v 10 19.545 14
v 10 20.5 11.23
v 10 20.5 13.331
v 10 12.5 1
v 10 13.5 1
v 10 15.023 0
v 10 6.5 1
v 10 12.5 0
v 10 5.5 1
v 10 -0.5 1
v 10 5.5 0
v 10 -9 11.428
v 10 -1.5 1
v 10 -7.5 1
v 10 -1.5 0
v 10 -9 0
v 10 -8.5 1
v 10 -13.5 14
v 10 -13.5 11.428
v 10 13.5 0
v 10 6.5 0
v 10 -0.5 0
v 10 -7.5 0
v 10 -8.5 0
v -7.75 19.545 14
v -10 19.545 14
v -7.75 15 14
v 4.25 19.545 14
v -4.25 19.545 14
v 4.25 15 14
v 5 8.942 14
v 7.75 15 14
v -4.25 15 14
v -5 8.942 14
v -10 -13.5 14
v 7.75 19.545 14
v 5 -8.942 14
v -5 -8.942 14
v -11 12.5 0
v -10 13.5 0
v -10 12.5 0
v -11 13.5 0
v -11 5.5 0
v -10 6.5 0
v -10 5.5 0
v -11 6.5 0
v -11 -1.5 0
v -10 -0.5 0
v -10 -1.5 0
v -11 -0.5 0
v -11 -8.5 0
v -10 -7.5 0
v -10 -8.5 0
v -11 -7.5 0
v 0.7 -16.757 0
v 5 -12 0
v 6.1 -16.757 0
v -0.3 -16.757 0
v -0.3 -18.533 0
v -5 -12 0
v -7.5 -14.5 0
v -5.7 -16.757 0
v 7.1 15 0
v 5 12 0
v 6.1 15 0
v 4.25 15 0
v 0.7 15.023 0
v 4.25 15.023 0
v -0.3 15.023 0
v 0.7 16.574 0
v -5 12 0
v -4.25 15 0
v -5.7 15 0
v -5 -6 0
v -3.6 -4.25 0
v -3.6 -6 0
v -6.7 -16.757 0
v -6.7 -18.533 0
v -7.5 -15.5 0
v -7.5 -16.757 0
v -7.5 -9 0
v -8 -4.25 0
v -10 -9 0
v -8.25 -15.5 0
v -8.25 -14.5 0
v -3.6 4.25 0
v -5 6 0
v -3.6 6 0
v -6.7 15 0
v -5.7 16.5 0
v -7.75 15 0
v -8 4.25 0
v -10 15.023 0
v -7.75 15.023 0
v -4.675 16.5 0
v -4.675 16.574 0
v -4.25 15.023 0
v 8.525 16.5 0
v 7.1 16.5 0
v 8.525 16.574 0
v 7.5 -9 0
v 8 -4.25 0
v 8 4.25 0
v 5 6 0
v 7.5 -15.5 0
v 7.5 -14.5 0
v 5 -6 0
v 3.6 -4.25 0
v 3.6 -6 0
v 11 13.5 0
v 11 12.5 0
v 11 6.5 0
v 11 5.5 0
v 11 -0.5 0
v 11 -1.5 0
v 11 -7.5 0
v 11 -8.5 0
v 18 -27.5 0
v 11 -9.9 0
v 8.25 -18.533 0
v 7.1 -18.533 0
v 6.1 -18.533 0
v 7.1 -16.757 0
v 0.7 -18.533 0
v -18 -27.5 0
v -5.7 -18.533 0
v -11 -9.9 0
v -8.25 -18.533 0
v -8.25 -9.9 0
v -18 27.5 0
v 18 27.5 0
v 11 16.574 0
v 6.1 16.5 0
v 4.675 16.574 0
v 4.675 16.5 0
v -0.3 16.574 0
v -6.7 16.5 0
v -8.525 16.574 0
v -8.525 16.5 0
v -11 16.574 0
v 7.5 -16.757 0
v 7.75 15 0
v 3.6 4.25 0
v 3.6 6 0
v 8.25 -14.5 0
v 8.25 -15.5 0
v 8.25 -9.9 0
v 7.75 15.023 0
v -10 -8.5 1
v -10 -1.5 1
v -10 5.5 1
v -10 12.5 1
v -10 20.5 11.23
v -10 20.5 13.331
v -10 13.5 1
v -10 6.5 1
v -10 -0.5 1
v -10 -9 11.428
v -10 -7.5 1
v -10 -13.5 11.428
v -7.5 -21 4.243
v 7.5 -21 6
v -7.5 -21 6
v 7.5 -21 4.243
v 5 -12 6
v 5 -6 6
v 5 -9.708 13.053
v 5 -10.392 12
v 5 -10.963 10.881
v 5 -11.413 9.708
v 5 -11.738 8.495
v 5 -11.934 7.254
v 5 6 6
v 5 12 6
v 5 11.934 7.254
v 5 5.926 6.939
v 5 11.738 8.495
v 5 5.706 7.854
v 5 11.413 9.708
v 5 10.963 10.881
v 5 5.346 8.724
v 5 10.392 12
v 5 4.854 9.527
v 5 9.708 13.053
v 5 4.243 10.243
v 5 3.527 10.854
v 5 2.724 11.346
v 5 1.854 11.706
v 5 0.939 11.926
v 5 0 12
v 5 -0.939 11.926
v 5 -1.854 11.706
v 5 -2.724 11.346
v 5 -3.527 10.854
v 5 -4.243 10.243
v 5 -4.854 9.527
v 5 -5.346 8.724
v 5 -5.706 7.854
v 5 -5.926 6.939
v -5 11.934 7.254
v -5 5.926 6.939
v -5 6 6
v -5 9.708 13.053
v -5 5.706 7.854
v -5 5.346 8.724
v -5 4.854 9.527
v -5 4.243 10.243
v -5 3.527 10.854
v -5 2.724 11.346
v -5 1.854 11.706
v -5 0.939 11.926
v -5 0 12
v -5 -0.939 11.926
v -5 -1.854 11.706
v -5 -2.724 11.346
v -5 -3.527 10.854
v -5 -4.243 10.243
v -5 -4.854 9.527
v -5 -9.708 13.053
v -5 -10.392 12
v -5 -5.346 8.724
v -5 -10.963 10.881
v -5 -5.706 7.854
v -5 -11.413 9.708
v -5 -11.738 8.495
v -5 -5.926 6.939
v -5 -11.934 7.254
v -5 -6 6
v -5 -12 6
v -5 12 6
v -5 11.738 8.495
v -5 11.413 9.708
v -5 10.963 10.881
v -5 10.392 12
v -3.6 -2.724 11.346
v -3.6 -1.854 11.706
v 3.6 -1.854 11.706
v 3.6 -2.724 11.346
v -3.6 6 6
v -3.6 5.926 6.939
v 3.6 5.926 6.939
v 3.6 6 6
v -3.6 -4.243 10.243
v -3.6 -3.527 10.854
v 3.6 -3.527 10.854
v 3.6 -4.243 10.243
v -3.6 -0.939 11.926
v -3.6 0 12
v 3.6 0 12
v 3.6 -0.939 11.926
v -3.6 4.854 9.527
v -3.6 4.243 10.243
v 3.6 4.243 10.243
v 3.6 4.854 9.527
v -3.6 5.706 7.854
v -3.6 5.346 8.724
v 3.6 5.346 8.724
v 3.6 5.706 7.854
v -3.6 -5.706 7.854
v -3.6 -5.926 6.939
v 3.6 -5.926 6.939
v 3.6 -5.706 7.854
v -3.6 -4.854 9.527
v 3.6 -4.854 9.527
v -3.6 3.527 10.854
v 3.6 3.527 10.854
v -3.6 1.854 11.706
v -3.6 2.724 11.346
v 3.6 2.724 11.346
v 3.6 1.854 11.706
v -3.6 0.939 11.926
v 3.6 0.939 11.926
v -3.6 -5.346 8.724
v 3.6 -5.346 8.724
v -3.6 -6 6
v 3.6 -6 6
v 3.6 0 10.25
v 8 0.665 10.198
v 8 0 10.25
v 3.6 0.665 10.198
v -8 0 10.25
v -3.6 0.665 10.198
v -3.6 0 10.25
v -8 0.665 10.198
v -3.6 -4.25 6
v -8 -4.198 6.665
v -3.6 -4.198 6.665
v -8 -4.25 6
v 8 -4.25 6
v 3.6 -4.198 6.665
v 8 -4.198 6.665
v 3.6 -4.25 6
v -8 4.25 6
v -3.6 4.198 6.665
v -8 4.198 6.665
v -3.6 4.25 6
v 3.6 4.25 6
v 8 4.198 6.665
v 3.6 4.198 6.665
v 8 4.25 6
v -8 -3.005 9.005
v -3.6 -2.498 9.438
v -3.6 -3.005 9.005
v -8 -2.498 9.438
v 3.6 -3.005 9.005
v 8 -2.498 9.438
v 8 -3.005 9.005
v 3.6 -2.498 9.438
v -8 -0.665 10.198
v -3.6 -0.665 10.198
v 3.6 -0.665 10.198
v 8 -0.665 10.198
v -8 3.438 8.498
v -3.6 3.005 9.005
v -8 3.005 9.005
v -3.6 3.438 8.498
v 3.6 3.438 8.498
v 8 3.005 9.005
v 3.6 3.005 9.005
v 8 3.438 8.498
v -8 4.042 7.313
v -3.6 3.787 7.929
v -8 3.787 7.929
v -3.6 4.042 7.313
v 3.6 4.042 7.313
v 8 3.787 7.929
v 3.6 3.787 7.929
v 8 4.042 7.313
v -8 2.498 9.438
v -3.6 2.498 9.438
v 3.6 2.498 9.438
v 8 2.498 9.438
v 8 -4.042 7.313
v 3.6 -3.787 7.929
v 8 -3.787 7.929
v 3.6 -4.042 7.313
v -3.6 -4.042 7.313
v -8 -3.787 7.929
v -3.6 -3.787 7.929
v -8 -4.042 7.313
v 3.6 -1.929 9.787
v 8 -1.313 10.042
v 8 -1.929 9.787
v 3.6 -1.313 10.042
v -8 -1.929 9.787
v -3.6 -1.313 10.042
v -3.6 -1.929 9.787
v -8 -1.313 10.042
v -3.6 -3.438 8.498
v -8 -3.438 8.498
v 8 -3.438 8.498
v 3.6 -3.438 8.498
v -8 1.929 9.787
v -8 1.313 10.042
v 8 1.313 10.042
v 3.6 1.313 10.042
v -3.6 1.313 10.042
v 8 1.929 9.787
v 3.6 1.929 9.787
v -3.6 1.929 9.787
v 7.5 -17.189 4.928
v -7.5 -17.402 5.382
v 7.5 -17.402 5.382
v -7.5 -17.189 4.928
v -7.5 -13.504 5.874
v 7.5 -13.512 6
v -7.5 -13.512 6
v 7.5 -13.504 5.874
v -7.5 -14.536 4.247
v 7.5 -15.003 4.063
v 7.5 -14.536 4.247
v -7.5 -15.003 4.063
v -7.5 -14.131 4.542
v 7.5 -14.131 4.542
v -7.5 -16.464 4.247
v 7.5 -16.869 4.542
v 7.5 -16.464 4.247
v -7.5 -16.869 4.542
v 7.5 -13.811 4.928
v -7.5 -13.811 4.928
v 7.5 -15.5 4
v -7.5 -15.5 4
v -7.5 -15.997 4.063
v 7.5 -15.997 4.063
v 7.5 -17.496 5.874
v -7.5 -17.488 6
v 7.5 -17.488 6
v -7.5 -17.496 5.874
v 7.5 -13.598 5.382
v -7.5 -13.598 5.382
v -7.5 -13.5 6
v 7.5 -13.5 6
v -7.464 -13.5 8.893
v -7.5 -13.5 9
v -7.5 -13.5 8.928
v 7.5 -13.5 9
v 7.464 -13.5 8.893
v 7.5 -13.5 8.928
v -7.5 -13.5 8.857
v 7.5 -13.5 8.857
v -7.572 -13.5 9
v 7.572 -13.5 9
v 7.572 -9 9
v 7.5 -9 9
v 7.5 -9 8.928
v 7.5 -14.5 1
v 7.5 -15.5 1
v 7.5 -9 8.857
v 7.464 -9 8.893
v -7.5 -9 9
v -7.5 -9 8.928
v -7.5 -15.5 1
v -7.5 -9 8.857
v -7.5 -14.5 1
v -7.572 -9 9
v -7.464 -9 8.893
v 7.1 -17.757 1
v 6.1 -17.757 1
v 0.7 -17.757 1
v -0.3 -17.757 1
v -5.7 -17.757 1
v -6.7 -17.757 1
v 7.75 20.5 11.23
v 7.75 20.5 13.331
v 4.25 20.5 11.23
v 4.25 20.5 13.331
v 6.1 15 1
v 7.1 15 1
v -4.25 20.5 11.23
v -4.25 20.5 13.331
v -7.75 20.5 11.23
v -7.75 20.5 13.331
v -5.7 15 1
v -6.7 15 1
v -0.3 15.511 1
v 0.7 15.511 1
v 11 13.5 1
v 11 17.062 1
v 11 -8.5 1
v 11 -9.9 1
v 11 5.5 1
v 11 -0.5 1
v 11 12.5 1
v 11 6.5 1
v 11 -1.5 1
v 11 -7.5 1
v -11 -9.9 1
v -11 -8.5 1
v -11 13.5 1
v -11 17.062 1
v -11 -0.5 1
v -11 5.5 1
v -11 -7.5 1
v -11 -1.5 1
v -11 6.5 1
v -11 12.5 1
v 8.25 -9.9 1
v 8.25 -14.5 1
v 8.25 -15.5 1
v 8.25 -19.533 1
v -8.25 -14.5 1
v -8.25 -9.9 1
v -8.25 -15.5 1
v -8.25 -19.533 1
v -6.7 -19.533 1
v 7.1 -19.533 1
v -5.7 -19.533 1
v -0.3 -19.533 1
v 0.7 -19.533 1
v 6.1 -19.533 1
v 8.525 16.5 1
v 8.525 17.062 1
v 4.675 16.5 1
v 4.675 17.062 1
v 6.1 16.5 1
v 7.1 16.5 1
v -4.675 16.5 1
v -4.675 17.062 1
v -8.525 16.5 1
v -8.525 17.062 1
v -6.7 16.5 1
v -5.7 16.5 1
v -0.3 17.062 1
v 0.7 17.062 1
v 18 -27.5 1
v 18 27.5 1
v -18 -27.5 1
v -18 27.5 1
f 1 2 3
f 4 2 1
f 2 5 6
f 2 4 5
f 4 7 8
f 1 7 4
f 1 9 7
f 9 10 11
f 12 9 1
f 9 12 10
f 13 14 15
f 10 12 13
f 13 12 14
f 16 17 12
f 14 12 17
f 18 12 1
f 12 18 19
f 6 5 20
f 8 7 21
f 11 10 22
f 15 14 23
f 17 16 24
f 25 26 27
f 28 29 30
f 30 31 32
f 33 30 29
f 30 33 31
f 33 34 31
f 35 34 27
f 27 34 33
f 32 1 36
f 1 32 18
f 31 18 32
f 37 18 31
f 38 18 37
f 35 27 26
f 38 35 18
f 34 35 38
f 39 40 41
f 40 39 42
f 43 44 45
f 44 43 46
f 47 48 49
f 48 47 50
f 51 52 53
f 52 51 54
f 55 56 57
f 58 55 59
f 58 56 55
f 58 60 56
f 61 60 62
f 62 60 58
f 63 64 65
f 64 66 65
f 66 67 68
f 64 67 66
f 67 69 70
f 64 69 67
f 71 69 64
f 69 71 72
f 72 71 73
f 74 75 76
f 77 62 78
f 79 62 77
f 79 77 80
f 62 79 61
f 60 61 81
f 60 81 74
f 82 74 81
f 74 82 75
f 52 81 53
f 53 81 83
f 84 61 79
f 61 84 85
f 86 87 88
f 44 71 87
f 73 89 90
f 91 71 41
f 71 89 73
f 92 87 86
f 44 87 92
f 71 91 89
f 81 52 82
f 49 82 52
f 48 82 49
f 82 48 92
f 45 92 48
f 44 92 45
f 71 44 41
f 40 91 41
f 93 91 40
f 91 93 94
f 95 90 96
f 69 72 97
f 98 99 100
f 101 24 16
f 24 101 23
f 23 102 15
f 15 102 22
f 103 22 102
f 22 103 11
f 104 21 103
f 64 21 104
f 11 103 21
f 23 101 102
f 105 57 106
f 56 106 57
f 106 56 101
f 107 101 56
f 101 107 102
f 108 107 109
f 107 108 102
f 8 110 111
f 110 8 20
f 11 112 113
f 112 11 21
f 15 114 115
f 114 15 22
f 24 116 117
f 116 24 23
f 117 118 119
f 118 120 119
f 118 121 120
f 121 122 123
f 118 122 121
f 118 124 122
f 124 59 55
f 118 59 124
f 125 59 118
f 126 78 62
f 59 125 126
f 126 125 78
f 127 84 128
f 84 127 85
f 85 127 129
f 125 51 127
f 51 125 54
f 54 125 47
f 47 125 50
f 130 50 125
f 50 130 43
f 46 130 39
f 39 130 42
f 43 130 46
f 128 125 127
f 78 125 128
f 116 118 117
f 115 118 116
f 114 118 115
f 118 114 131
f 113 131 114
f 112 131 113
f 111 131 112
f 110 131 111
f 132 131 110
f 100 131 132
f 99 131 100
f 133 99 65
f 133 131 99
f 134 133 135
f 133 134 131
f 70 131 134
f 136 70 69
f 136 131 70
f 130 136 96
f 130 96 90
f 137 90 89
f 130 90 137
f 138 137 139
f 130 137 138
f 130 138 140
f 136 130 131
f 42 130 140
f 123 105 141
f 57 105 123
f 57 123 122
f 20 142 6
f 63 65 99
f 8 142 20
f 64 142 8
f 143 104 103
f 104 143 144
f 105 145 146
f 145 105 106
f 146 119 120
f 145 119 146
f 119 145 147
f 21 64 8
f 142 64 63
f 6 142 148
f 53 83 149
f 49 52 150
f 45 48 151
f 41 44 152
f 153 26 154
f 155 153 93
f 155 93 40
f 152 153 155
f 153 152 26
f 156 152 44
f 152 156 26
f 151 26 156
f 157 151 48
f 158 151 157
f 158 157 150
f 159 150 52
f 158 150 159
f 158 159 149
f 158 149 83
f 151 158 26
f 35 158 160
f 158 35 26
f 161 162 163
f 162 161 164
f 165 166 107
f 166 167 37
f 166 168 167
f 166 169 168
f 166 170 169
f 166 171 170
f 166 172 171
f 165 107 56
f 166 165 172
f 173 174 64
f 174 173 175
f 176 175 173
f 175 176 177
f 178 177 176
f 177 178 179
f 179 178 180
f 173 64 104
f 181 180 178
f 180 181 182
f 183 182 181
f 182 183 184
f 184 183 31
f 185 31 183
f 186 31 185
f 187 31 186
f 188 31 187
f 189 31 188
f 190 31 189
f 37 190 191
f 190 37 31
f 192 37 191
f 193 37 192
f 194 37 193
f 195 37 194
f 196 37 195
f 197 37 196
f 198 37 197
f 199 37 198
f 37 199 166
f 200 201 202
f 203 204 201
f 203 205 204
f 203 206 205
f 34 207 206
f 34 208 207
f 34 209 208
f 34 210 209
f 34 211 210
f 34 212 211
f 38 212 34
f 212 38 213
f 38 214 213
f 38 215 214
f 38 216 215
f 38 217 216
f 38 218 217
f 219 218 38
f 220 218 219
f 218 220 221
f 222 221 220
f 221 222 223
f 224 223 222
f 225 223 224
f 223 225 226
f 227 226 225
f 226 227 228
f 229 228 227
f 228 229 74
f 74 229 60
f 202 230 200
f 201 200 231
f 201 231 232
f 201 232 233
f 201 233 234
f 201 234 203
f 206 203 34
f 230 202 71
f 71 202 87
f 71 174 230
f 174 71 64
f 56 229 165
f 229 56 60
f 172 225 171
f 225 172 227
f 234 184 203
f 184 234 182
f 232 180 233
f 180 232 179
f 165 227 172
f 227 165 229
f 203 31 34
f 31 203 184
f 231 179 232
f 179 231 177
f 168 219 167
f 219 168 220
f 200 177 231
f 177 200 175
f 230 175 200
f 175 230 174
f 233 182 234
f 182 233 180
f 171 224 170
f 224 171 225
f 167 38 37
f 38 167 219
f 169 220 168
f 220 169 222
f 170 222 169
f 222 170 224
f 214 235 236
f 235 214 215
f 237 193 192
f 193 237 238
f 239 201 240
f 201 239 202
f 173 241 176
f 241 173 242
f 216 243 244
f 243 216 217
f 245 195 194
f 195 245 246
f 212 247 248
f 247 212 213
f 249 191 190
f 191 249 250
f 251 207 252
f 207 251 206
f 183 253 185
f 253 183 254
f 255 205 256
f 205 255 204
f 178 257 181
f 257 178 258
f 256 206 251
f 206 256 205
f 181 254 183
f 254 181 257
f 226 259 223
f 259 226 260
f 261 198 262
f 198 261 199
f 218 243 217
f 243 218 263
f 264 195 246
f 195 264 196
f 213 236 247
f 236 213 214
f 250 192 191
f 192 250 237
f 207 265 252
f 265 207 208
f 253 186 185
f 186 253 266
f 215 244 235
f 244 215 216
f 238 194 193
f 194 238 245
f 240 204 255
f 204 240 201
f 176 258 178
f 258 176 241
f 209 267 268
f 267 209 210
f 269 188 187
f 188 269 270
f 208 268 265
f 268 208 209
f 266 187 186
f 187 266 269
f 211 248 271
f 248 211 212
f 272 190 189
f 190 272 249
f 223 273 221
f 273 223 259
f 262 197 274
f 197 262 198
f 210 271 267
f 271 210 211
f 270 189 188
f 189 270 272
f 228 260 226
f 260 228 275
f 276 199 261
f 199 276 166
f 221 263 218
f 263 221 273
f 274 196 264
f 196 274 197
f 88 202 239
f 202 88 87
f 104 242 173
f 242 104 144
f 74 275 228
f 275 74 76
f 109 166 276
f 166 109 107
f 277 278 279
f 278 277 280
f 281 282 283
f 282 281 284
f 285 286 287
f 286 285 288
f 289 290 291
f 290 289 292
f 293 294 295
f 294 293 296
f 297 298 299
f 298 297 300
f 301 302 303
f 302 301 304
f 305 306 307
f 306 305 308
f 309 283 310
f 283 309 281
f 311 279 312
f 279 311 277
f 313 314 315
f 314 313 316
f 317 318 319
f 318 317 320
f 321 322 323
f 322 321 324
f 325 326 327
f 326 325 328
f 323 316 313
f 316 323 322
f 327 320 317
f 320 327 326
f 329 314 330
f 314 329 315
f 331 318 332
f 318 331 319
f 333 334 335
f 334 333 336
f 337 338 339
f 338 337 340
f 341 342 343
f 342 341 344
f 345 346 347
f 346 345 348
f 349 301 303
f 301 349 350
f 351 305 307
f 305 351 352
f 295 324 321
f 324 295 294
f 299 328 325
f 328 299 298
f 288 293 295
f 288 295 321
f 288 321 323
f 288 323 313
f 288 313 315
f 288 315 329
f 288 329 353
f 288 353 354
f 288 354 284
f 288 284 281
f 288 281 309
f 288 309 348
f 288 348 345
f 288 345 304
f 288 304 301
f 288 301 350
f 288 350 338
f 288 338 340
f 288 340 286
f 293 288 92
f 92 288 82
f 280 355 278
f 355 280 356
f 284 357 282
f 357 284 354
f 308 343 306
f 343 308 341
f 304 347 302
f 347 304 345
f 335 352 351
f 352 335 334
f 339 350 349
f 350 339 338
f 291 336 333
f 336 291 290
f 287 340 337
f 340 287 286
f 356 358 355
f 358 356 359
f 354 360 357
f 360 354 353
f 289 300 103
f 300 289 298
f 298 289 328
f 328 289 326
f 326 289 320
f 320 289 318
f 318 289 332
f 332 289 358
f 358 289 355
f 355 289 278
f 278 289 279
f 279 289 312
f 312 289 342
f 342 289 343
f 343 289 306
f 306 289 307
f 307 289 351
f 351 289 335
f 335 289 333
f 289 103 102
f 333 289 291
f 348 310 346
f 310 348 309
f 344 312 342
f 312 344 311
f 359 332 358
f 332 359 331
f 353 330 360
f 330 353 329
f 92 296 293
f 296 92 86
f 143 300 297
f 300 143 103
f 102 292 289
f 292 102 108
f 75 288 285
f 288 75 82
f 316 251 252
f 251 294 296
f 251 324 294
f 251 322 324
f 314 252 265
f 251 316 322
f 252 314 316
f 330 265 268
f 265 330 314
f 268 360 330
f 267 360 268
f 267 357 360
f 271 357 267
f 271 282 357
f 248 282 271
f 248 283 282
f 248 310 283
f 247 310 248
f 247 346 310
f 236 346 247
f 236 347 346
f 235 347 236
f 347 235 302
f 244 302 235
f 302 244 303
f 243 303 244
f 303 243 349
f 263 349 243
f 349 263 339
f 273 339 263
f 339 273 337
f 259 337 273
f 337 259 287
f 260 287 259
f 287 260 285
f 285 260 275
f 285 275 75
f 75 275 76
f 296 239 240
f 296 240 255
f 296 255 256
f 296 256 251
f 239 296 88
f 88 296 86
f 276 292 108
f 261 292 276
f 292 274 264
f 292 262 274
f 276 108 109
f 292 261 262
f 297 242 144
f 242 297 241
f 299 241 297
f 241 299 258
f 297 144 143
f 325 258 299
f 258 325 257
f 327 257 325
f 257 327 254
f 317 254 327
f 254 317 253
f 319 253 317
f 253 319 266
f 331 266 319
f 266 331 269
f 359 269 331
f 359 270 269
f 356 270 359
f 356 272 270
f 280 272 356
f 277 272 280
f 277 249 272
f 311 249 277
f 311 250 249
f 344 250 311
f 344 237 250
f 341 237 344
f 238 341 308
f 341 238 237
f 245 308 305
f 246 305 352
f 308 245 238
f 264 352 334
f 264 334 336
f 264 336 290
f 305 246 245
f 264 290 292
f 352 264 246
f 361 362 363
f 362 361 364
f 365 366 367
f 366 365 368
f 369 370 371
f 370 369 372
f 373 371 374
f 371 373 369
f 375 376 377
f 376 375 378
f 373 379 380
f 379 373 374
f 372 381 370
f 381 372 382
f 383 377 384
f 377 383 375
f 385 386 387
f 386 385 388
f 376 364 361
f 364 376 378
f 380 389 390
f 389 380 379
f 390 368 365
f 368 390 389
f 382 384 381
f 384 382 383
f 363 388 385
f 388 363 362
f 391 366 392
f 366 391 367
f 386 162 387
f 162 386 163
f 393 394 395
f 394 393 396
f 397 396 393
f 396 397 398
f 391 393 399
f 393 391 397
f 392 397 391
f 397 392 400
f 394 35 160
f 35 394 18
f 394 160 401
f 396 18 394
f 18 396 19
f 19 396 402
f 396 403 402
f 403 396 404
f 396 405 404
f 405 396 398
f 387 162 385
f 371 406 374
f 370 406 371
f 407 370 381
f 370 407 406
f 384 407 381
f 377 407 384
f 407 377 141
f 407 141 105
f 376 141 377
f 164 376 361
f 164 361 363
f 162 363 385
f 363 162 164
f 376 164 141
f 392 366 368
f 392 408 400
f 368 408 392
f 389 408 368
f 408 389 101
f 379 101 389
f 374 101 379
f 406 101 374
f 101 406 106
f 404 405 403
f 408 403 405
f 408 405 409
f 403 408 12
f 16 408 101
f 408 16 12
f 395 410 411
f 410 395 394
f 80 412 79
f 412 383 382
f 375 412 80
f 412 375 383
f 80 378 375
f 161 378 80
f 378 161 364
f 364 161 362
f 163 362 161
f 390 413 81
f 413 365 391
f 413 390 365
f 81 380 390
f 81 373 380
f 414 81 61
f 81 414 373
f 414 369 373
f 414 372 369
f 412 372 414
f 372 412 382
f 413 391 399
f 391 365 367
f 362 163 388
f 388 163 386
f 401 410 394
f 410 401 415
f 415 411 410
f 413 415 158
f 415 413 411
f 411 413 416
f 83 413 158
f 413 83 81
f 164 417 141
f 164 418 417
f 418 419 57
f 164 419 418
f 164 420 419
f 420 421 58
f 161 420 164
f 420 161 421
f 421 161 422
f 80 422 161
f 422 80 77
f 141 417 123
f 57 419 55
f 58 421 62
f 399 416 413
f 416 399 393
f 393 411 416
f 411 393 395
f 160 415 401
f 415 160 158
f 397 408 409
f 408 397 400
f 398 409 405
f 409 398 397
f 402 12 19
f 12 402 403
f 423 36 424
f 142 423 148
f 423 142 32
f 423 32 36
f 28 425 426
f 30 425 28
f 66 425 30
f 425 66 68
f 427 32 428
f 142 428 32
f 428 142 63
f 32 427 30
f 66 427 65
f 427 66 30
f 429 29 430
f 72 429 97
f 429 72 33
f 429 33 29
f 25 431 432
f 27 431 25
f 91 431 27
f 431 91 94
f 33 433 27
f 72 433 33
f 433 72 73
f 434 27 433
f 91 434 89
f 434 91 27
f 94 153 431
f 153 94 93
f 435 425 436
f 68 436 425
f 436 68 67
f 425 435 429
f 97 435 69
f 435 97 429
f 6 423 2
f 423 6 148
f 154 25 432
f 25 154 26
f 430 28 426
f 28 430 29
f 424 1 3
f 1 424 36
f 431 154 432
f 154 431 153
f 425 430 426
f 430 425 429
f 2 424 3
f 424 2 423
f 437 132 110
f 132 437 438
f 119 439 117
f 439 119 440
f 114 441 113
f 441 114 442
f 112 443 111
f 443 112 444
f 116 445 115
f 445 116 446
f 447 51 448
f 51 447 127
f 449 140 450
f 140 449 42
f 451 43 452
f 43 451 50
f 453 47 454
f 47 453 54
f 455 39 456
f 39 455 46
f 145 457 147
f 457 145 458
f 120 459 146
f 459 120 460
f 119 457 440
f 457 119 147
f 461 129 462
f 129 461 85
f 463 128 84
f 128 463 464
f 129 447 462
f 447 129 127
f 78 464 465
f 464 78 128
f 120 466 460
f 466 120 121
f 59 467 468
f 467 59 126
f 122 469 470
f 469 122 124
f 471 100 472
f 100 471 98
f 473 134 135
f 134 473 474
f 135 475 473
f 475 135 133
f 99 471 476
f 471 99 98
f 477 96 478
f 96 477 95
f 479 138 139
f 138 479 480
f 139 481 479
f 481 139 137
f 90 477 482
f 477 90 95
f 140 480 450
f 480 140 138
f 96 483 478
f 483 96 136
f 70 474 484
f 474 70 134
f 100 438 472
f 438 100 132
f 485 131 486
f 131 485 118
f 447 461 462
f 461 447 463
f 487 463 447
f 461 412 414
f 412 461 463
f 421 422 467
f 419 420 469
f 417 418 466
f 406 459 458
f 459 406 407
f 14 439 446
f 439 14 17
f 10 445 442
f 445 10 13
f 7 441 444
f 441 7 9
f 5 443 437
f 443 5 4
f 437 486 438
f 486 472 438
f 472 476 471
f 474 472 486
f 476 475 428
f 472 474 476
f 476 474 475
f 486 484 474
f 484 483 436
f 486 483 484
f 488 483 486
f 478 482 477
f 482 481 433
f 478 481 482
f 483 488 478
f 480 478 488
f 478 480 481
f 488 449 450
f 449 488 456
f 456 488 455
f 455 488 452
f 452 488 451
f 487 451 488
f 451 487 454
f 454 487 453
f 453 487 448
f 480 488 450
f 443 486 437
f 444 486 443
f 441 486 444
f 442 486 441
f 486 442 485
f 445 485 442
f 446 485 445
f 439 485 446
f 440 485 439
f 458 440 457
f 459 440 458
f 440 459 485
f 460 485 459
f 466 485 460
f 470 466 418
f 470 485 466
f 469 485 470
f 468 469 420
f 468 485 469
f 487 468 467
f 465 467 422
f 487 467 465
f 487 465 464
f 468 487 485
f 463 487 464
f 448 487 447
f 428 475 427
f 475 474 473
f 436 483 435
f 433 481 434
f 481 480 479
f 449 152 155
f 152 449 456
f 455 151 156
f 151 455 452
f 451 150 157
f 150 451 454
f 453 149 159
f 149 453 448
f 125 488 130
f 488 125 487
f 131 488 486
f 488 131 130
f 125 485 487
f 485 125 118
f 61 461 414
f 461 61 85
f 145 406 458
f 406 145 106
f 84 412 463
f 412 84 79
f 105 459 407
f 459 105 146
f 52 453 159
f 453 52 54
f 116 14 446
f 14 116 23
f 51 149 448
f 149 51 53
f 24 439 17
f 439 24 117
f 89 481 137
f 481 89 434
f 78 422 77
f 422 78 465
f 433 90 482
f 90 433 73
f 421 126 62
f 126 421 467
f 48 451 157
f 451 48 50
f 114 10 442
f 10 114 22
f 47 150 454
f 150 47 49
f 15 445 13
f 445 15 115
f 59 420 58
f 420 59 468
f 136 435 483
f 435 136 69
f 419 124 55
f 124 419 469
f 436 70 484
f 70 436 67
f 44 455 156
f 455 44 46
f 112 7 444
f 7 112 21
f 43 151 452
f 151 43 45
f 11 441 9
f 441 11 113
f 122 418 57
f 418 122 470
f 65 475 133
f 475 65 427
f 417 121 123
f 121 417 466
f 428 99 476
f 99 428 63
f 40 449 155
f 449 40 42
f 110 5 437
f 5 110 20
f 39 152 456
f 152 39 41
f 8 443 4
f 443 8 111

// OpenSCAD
// Airtripper's Bowden 3D Printer Extruder Revision 3
// by Airtripper May  © 2012
// airtripper.com
// It is licensed under the Creative Commons - GNU GPL license. 

// Printable extruder parts
	// set to true to show or false to hide.
	// F6 to compile, then menu: Design->Export as STL

show_extruder = false;
show_idler = false;
show_idler_with_flange = true;
show_strut = false;
show_axle = false;
show_all = false;
show_extruder_axle = false;
show_idler_strut = false;


if (show_extruder) {
	translate([0,0,0]) rotate([0,0,270]) extruder_block();
}
if (show_idler) {
	extruder_idler_608z();
} 
if (show_idler_with_flange) {
	idler_and_flange();
}
if (show_strut) {
	support_strut();
} 
if (show_axle) {
	axle_8mm();
} 
if (show_all) {
	translate([0,-20,0]) rotate([0,0,270]) extruder_block();
	translate([10,14,0]) rotate([0,0,90]) extruder_idler_608z(); //idler_and_flange();
	translate([10,32,0]) rotate([0,0,0]) support_strut();
	translate([-20,12,0]) rotate([0,0,0]) axle_8mm();
} 
if (show_extruder_axle) {
	translate([0,-10,0]) rotate([0,0,270]) extruder_block();
	translate([-0,22,0]) rotate([0,0,0]) axle_8mm();
}
if (show_idler_strut) {
	translate([0,-8,0]) rotate([0,0,90]) extruder_idler_608z(); //idler_and_flange();
	translate([0,10,0]) rotate([0,0,0]) support_strut();
} 


// Assembled components

//extruder();
//idler_608z();
//stepper_kit();


// Non printable hardware components

//nema17();
//insert();
//bearing(5, 10, 4);
//bearing(8, 22, 7);
//m4_bolt(40);



nema_l=71.5; // Stepper total length
nema_x=42;
nema_y=42;
nema_z=47.4;
screw_l=30;
insert_l=15; // Filament gripper insert length




// ************** Idler with Flange ***********************

module idler_and_flange() {
	extruder_idler_608z();
	difference() {
		union() {
			difference() {
				translate([0,0,0.5]) color("red") cube([36,55,1], center=true);
				translate([0,0,-0.1]) scale([1.1,1.1,1.1]) extruder_idler_608z();
			}
			for(r=[1:5]) {
				translate([0,r*70/10-22,0.5]) cube([30,1,1], center=true);
				translate([r*64/10-19,0,0.5]) rotate([0,0,90]) cube([50,1,1], center=true);
			}
		}
		union() {
			translate([0,0,0.5]) color("red") cube([12,28,2], center=true);
			translate([0,0,0.5]) color("red") cube([18,10,2], center=true);
		}
	}


}



// ##########################################################

module axle_8mm() {
	cylinder(16,r=3.80, $fn=40);
	// Support flange while printing
	translate([-5,-0.5,0]) cube([10,1,1]);
	translate([-0.5,-5,0]) cube([1,10,1]);
	difference() {
		cylinder(1,r=10, $fn=40);
		translate([0,0,-1]) cylinder(3,r=5, $fn=40);
	}
}


// ##########################################################

module extruder_idler_608z() {
	//translate([0,0,6]) rotate([0,90,0]) bearing(8, 22, 7);
	difference() {
		union() {
			difference() {
				translate([0,0,7]) cube([20,42,14], center = true);
				// Bearing housing
				//translate([-6,0,8]) cube([10,50,20], center = true);
				translate([0,0,1]) cube([10,24,10], center = true);
				translate([-5,0,6]) rotate([0,90,0]) cylinder(10,r=12, $fn=60);
			}
			// Axle spacer
			translate([-8,0,6]) rotate([0,90,0]) cylinder(16,r=6, $fn=40);
			translate([0,0,3]) cube([16,12,6], center = true);
		}
		union() {
			// Bearing axle cut-out
			translate([-8,0,6]) rotate([0,90,0]) cylinder(16,r=4.25, $fn=40);
			translate([0,0,2]) cube([16,8.5,8], center = true);
			translate([-3.6,0,6]) rotate([0,90,0]) cylinder(7.2,r=12, $fn=60);
			// hook
			translate([-9,-15.5,6]) rotate([0,90,0]) cylinder(22,r=2, $fn=25);
			translate([0,-18.5,11]) cube([22,10,10], center = true);
			translate([9,-17,1]) cube([3,16,16], center = true);
			translate([-9,-17,1]) cube([3,16,16], center = true);
			translate([0,-21,0]) rotate([45,0,0]) cube([24,6,10], center = true);
			translate([-11,-12,9.6]) rotate([0,135,0]) cube([4,6,6], center = true);
			translate([11,-12,9.6]) rotate([0,45,0]) cube([4,6,6], center = true);
			// Bolt slots
			translate([6,20,7]) cube([3.5,10,16], center = true);
			translate([-6,20,7]) cube([3.5,10,16], center = true);
			translate([0,24,7]) rotate([154,0,0]) cube([22,10,26], center = true);
			translate([0,26.5,25]) rotate([145,0,0]) cube([22,10,26], center = true);
			translate([0,25.5,7]) cube([22,10,16], center = true);
			//Padding
			//translate([-9,-17,7]) cube([6,10,16], center = true);
		}
	}

}


// #########################################################

// Revision 3

module extruder_block() {
	difference() {
		union() {
			// Extruder base
			translate([0,0,1.5]) cube([42,42,3], center = true);

			// Bearing supports between screw columns and shaft bearing
			rotate([0,0,45]) translate([0,11,13]) cube([3,22,26], center = true);
			rotate([0,0,315]) translate([0,-11,13]) cube([3,22,26], center = true);
			difference() {
				translate([-3,0,22]) cylinder(8,r1=4, r2=4, $fn=50, center = true);
				rotate([0,90,0]) translate([-17,0,-10]) cylinder(8,r=4, $fn=50);
			}
			difference() {
				translate([0,0,3]) cylinder(22,r1=13.5, r2=6.3, $fn=100);	// rev. 3
				rotate([0,0,45]) translate([8,0,13]) cube([15,30,26.5], center = true);	// rev. 3
				rotate([0,0,315]) translate([8,0,13]) cube([15,30,26.5], center = true);	// rev. 3
			}
			// M3 Screw columns for stepper attachment
			translate([-15.5,15.5,0]) cylinder(26,r=4, $fn=50);	// rev. 3
			translate([-15.5,15.5,18]) cylinder(8,r1=4,r2=6, $fn=50);	// rev. 3
			translate([-15.5,-15.5,0]) cylinder(23.5,r=4, $fn=50);	// rev. 3
			translate([-15.5,-15.5,17.5]) cylinder(6,r1=4,r2=5, $fn=50);	// rev. 3
			translate([15.5,-15.5,3]) cylinder(1.5,r=3.5, $fn=50);	// rev. 3

			// fixing plate
			difference() {
				translate([-20,0,10]) cube([3,74,20], center = true);
				union() {

					// fixing plate cutout
					translate([-20,0,12]) cube([6,30,18], center = true);
					translate([-20,34,0]) rotate([45,0,0]) cube([6,16,7], center = true);
					translate([-20,-34,0]) rotate([135,0,0]) cube([6,16,7], center = true);
					translate([-20,34,20]) rotate([135,0,0]) cube([6,16,7], center = true);
					translate([-20,-34,20]) rotate([45,0,0]) cube([6,16,7], center = true);
					// M6 bolt holes
					translate([-23,30.5,10]) rotate([0,90,0]) cylinder(6, r=3.5, $fn=25);
					translate([-23,-30.5,10]) rotate([0,90,0]) cylinder(6, r=3.5, $fn=25);
					// just holes
					// translate([-23,21.5,10]) rotate([0,90,0]) cylinder(6, r=3, $fn=25);	// rev. 3
					// translate([-23.8,-21.5,10]) rotate([0,90,0]) cylinder(6, r=3, $fn=25);	// rev. 3
				}
			} // End of fixing plate
		}
		union() {
			// Stepper shaft, gear insert and bearing cut-out
			translate([0,0,9.8]) cylinder(20,r1=13, r2=5, $fn=50, center = true);	// rev. 3
			translate([0,0,22]) cylinder(5,r=5, $fn=50, center = true);
			translate([0,0,27]) cylinder(8	,r=4, $fn=50, center = true);
			translate([0,0,25.5]) cylinder(2,r1=5, r2=4, $fn=50, center = true);
			translate([0,0,10.5]) cylinder(8	,r=7, $fn=100);	// rev. 2
			translate([0,0,18.5]) cylinder(3.5,r1=7, r2=3.5, $fn=50);	// rev. 2

			// Reduce wall and screw shaft for strut placement
			translate([-15.5,-15.5,23.5]) cylinder(5,r=3, $fn=30);
			translate([-12.5,-15.5,25.5]) cube([12,9,4], center = true);
			translate([-11.4,-11.4,27.9]) rotate([25,0,315]) cube([5,10,5], center = true);

			// just a hole in walls
			//#translate([-13,-7,15]) rotate([90,0,45]) cylinder(6, r=4, $fn=25);
			//#translate([-6,9,15]) rotate([90,0,315]) cylinder(6, r=2, $fn=25);
			//#translate([-9,-4,22]) rotate([90,0,45]) cylinder(6, r=2, $fn=25);
			//#translate([-4,9,22]) rotate([90,0,315]) cylinder(6, r=2, $fn=25);

			// Just a hole in base
			translate([16,0,-1]) cylinder(5, r=2.5, $fn=25);
			// #translate([0,-16,-1]) cylinder(5, r=2.5, $fn=25);	// rev. 3
			translate([-16,0,-1]) cylinder(5, r=2, $fn=25);

			// M3 screw holes
			for(r=[1:4]) {
				rotate([0,0,r*360/4]) translate([15.5,15.5,-1]) cylinder(40,r=1.75, $fs=.1);
			}
			translate([-15.5,15.5,22.1]) cylinder(4,r=3.3, $fn=30);	// rev. 3
			translate([15.5,15.5,1.5]) cylinder(4,r=3.25, $fs=.1);	// rev. 3
		}
	}
	// Filament in-feed bracket
	difference() {
		union() {
			// #translate([3.7,-22,10]) cube([10,3,20], center = true);	// rev. 3
			// #translate([5,-15,7]) cube([3,12,12], center = true);	// rev. 3
			// #translate([4.8,-9,15]) rotate([90,0,0]) cylinder(14, r=3.5, $fn=50);	// rev. 3
			translate([8.5,-20,3]) rotate([0,0,90]) infeed_block();	// rev. 3
			translate([-12,-17,3]) rotate([0,0,-12]) cube([14,2,16]);	// rev. 3
		}
		translate([4.8,-8,15]) rotate([90,0,0]) cylinder(18, r=1.3, $fn=25);	// rev. 2, 3
		translate([4.8,-21,15]) rotate([90,0,0]) cylinder(8, r1=1.1, r2=4, $fn=25);	// rev. 3
		translate([0,0,10]) cylinder(20,r1=13, r2=5, $fn=50, center = true);
		// #translate([5,-10,13]) cube([10,6,20], center = true);	// rev. 2, 3
	}
	// Bowdon out-feed tube holder
	difference() {
		union() {
			translate([4.8,14,13]) cube([8,14,26], center = true);
			translate([4.8,25,10]) cube([14,8,20], center = true);	// rev. 3
			translate([-5.5,12.5,13]) cube([13.5,3,26], center = true);	// rev. 3
			// translate([0,12.5,13]) cube([2,3,26], center = true);	// rev. 3
			// translate([-4.5,12.5,4]) cube([13.5,3,3], center = true);	// rev. 3
			// #translate([0,17,17]) cube([2,6,20], center = true);	// rev. 3
			translate([3.3,21,13]) cube([11,3,26], center = true);	// rev. 3
		}
		union() {
			// Tube and filament holes
			translate([4.8,36,15]) rotate([90,0,0]) cylinder(16, r=2.25, $fn=25);
			translate([4.8,24,15]) rotate([90,0,0]) cylinder(20, r=1.1, $fn=25);	// rev. 2, 3
			translate([5.3,16,15]) rotate([90,0,5]) cylinder(10, r1=0.4, r2=3, $fn=25);	// rev. 3

			// Insert and idler clearance
			translate([0,0,9.9]) cylinder(20,r1=13, r2=5, $fn=50, center = true);	// rev. 3

			// M3 bolt holes for idler preloader
			translate([3,17,20.5]) rotate([0,90,12]) cylinder(10, r=2.75, $fn=25);	// rev. 3
			translate([3,17,9.5]) rotate([0,90,12]) cylinder(10, r=2.75, $fn=25);	// rev. 3
			translate([-0.5,17,20.5]) rotate([0,90,0]) cylinder(10, r=2, $fn=25);
			translate([-0.5,17,9.5]) rotate([0,90,0]) cylinder(10, r=2, $fn=25);

			// m4 nut slot
			translate([4.8,24.5,16]) cube([7.45,3.45,10.5], center = true);	// rev. 3
			translate([4.8,27.5,19.5]) cube([4.5,3.2,9.2], center = true);	// rev.	3

			// just a hole
			translate([4.8,42,6]) rotate([90,0,0]) cylinder(16, r=4.5, $fn=25);	// rev. 3
			translate([-3.5,15.5,9.5]) rotate([90,0,0]) cylinder(6, r=3.5, $fn=25);	// rev. 3
			translate([-3.5,15.5,20.5]) rotate([90,0,0]) cylinder(6, r=3.5, $fn=25);	// rev. 3

			// Bowden filament guide in-feed Cut off
			translate([11,7.5,14]) rotate([0,0,35]) cube([8,4,28], center = true);	// rev. 3
			translate([4.5,8.5,25]) cube([10,4,10], center = true);	// rev. 3
		}
	}
	
}

// #########################################################

//support_strut();

module support_strut() {

	difference() {
		union() {
			translate([-15.5,0,0]) color("red") cylinder(6, r=5, $fn=30);
			translate([15.5,0,0]) color("red") cylinder(6, r=5, $fn=30);
			translate([-15.5,-3.5,0]) color("red") cube([31,7,6]);
		}
		union() {
			// Screw holes
			translate([-15.5,0,-1]) color("red") cylinder(5, r=1.75, $fn=30);
			translate([15.5,0,-1]) color("red") cylinder(5, r=1.75, $fn=30);
			translate([-15.5,0,3]) color("red") cylinder(5, r=3, $fn=30);
			translate([15.5,0,3]) color("red") cylinder(5, r=3, $fn=30);
		}
	}
}


// #########################################################

module extruder() {
	translate([0,0,-nema_z]) stepper_kit();
	extruder_block();
	translate([10,0,15]) rotate([0,90,-2]) idler_608z();
	translate([0,-15.5,23.5]) support_strut();
	translate([15.5,-15.5,4]) spacer(3,6.5,3);
	translate([-1.4,17,20.5]) rotate([0,90,0]) m3_bolt(40);
	translate([-1.4,17,9.5]) rotate([0,90,0]) m3_bolt(40);
}

// #########################################################

module idler_608z() {
	translate([0,0,6]) rotate([0,90,0]) bearing(8, 22, 7);
	extruder_idler_608z();
}


// #########################################################



// infeed_block();

module infeed_block() {
	 polyhedron(
	  points=[ [0,0,0],[0,8,0],[2,8,0],[2,0,0], // the six points at base
				[-5,0,8],[-5,8,8],[7,0,8],[7,8,8],
				[-5,0,16],[-5,8,16],[7,0,16],[7,8,16]
				],
				
	  triangles=[ [0,3,1],[2,1,3],
				[4,0,1],[1,5,4],[7,2,3],[7,3,6],
				[1,2,5],[2,7,5],[4,6,0],[6,3,0],// [4,5,7],[7,6,4],
				[11,9,5],[5,7,11],[10,11,7],[7,6,10],
				[5,9,8],[8,4,5],[4,8,10],[10,6,4],[8,9,11],[11,10,8]
				]          // each triangle side
										 // two triangles for square base
	 );
}



// #########################################################

// stepper_kit();

module stepper_kit() {
	union() {
		nema17();
		translate([0,0,nema_l-2]) bearing(5, 10, 4);
		translate([0,0,nema_l-insert_l-4]) insert();
		// translate([13.57,0,nema_l-9]) bearing(4, 17.5, 8);
		rotate([90,0,0]) translate([4.825,nema_l-9,0]) color("blue") cylinder(100, r=0.875, center = true, $fs=.1);
	}

}


// #########################################################

//bearing(6, 19, 6);
module bearing(id, od, w) {
	difference() {
		union() {
			translate([0,0,0]) color("red") cylinder(w,r=od/2, center = true, $fs=.1);
		}
		union() {
			translate([0,0,0]) cylinder(w+2,r=od/2-1, center = true, $fs=.1);
		}
	}
	difference() {
		union() {
			translate([0,0,0]) color("red") cylinder(w,r=id/2+1, center = true, $fs=.1);
			translate([0,0,0]) color("black") cylinder(w-0.5,r=od/2-1, center = true, $fs=.1);
		}
		union() {
			translate([0,0,0]) cylinder(w+2,r=id/2, center = true, $fs=.1);
		}
	}
}

// #########################################################

//insert();
module insert() {
//insert_l=15; // Filament gripper insert length
	difference() {
		union() {
			translate([0,0,0]) color("gold") cylinder(5.3,r=6.25, $fa=60); // Nut part of insert
			translate([0,0,5.3]) color("gold") cylinder(9.7,r=3.95, $fs=.1); // Teeth part
		}
		union() {
			translate([0,0,-1]) cylinder(17,r=2.5, $fs=.1); // Insert bore
		}
	}
}

// #########################################################

module nema17() {
// Stepper body size
//nema_x=42;
//nema_y=42;
//nema_z=47.4;
//screw_l=16;
// Stepper body silver end caps z length
body = nema_z/100*50;
cap = nema_z/100*25;

	difference() {
		union() {
			translate([-nema_x/2,-nema_y/2,cap]) color("black") cube([nema_x,nema_y,body]);
			translate([-nema_x/2,-nema_y/2,0]) color("silver") cube([nema_x,nema_y,cap]);
			translate([-nema_x/2,-nema_y/2,cap+body]) color("silver") cube([nema_x,nema_y,cap]);
			translate([0,0,cap*2+body]) color("grey") cylinder(1.7,r=11, $fs=.1);
			translate([0,0,cap*2+body+1.7]) color("silver") cylinder(22.5,r=2.5, $fs=.1);
		}
		union() {
			for(r=[1:4]) {
				rotate([0,0,r*360/4]) translate([15.5,15.5,cap*2+body-5]) cylinder(6,r=1.5, $fs=.1);
			}

		}
	}
	for(r=[1:4]) {
		rotate([0,0,r*360/4]) translate([15.5,15.5,cap*2+body-5]) color("Goldenrod") cylinder(screw_l,r=1.5, $fs=.1);
		// rotate([0,0,r*360/4]) translate([15.5,15.5,cap*2+body-5+screw_l]) color("Goldenrod") cylinder(1.8,r=2.8, $fs=3);
	}
}

// #########################################################

module screw() {
	for(r=[1:4]) {
		rotate([0,0,r*360/4]) translate([15.5,15.5,cap*2+body-5]) color("Goldenrod") cylinder(screw_l,r=1.5, $fs=.1);
		rotate([0,0,r*360/4]) translate([15.5,15.5,cap*2+body-5+screw_l]) color("Goldenrod") cylinder(1.8,r=2.8, $fs=3);
	}
}

// #########################################################

//spacer();

module spacer(h, od, id) {
	difference() {
		translate([0,0,0]) color("black") cylinder(h,r=od/2, $fs=.1);
		translate([0,0,-1]) color("black") cylinder(h+2,r=id/2, $fs=.1);
	}

}

// #########################################################

//m3_bolt();

module m3_bolt(l) {

		translate([0,0,2.2]) color("silver") cylinder(l,r=1.5, $fs=.1); // Bolt
		translate([0,0,0]) color("silver") cylinder(2.2,r=2.75, $fa=60); // Head


}
// #########################################################

//module_name();

module module_name() {
	difference() {
		union() {
			// Code1
		}
		union() {
			// Code 2
		}
	}
}
